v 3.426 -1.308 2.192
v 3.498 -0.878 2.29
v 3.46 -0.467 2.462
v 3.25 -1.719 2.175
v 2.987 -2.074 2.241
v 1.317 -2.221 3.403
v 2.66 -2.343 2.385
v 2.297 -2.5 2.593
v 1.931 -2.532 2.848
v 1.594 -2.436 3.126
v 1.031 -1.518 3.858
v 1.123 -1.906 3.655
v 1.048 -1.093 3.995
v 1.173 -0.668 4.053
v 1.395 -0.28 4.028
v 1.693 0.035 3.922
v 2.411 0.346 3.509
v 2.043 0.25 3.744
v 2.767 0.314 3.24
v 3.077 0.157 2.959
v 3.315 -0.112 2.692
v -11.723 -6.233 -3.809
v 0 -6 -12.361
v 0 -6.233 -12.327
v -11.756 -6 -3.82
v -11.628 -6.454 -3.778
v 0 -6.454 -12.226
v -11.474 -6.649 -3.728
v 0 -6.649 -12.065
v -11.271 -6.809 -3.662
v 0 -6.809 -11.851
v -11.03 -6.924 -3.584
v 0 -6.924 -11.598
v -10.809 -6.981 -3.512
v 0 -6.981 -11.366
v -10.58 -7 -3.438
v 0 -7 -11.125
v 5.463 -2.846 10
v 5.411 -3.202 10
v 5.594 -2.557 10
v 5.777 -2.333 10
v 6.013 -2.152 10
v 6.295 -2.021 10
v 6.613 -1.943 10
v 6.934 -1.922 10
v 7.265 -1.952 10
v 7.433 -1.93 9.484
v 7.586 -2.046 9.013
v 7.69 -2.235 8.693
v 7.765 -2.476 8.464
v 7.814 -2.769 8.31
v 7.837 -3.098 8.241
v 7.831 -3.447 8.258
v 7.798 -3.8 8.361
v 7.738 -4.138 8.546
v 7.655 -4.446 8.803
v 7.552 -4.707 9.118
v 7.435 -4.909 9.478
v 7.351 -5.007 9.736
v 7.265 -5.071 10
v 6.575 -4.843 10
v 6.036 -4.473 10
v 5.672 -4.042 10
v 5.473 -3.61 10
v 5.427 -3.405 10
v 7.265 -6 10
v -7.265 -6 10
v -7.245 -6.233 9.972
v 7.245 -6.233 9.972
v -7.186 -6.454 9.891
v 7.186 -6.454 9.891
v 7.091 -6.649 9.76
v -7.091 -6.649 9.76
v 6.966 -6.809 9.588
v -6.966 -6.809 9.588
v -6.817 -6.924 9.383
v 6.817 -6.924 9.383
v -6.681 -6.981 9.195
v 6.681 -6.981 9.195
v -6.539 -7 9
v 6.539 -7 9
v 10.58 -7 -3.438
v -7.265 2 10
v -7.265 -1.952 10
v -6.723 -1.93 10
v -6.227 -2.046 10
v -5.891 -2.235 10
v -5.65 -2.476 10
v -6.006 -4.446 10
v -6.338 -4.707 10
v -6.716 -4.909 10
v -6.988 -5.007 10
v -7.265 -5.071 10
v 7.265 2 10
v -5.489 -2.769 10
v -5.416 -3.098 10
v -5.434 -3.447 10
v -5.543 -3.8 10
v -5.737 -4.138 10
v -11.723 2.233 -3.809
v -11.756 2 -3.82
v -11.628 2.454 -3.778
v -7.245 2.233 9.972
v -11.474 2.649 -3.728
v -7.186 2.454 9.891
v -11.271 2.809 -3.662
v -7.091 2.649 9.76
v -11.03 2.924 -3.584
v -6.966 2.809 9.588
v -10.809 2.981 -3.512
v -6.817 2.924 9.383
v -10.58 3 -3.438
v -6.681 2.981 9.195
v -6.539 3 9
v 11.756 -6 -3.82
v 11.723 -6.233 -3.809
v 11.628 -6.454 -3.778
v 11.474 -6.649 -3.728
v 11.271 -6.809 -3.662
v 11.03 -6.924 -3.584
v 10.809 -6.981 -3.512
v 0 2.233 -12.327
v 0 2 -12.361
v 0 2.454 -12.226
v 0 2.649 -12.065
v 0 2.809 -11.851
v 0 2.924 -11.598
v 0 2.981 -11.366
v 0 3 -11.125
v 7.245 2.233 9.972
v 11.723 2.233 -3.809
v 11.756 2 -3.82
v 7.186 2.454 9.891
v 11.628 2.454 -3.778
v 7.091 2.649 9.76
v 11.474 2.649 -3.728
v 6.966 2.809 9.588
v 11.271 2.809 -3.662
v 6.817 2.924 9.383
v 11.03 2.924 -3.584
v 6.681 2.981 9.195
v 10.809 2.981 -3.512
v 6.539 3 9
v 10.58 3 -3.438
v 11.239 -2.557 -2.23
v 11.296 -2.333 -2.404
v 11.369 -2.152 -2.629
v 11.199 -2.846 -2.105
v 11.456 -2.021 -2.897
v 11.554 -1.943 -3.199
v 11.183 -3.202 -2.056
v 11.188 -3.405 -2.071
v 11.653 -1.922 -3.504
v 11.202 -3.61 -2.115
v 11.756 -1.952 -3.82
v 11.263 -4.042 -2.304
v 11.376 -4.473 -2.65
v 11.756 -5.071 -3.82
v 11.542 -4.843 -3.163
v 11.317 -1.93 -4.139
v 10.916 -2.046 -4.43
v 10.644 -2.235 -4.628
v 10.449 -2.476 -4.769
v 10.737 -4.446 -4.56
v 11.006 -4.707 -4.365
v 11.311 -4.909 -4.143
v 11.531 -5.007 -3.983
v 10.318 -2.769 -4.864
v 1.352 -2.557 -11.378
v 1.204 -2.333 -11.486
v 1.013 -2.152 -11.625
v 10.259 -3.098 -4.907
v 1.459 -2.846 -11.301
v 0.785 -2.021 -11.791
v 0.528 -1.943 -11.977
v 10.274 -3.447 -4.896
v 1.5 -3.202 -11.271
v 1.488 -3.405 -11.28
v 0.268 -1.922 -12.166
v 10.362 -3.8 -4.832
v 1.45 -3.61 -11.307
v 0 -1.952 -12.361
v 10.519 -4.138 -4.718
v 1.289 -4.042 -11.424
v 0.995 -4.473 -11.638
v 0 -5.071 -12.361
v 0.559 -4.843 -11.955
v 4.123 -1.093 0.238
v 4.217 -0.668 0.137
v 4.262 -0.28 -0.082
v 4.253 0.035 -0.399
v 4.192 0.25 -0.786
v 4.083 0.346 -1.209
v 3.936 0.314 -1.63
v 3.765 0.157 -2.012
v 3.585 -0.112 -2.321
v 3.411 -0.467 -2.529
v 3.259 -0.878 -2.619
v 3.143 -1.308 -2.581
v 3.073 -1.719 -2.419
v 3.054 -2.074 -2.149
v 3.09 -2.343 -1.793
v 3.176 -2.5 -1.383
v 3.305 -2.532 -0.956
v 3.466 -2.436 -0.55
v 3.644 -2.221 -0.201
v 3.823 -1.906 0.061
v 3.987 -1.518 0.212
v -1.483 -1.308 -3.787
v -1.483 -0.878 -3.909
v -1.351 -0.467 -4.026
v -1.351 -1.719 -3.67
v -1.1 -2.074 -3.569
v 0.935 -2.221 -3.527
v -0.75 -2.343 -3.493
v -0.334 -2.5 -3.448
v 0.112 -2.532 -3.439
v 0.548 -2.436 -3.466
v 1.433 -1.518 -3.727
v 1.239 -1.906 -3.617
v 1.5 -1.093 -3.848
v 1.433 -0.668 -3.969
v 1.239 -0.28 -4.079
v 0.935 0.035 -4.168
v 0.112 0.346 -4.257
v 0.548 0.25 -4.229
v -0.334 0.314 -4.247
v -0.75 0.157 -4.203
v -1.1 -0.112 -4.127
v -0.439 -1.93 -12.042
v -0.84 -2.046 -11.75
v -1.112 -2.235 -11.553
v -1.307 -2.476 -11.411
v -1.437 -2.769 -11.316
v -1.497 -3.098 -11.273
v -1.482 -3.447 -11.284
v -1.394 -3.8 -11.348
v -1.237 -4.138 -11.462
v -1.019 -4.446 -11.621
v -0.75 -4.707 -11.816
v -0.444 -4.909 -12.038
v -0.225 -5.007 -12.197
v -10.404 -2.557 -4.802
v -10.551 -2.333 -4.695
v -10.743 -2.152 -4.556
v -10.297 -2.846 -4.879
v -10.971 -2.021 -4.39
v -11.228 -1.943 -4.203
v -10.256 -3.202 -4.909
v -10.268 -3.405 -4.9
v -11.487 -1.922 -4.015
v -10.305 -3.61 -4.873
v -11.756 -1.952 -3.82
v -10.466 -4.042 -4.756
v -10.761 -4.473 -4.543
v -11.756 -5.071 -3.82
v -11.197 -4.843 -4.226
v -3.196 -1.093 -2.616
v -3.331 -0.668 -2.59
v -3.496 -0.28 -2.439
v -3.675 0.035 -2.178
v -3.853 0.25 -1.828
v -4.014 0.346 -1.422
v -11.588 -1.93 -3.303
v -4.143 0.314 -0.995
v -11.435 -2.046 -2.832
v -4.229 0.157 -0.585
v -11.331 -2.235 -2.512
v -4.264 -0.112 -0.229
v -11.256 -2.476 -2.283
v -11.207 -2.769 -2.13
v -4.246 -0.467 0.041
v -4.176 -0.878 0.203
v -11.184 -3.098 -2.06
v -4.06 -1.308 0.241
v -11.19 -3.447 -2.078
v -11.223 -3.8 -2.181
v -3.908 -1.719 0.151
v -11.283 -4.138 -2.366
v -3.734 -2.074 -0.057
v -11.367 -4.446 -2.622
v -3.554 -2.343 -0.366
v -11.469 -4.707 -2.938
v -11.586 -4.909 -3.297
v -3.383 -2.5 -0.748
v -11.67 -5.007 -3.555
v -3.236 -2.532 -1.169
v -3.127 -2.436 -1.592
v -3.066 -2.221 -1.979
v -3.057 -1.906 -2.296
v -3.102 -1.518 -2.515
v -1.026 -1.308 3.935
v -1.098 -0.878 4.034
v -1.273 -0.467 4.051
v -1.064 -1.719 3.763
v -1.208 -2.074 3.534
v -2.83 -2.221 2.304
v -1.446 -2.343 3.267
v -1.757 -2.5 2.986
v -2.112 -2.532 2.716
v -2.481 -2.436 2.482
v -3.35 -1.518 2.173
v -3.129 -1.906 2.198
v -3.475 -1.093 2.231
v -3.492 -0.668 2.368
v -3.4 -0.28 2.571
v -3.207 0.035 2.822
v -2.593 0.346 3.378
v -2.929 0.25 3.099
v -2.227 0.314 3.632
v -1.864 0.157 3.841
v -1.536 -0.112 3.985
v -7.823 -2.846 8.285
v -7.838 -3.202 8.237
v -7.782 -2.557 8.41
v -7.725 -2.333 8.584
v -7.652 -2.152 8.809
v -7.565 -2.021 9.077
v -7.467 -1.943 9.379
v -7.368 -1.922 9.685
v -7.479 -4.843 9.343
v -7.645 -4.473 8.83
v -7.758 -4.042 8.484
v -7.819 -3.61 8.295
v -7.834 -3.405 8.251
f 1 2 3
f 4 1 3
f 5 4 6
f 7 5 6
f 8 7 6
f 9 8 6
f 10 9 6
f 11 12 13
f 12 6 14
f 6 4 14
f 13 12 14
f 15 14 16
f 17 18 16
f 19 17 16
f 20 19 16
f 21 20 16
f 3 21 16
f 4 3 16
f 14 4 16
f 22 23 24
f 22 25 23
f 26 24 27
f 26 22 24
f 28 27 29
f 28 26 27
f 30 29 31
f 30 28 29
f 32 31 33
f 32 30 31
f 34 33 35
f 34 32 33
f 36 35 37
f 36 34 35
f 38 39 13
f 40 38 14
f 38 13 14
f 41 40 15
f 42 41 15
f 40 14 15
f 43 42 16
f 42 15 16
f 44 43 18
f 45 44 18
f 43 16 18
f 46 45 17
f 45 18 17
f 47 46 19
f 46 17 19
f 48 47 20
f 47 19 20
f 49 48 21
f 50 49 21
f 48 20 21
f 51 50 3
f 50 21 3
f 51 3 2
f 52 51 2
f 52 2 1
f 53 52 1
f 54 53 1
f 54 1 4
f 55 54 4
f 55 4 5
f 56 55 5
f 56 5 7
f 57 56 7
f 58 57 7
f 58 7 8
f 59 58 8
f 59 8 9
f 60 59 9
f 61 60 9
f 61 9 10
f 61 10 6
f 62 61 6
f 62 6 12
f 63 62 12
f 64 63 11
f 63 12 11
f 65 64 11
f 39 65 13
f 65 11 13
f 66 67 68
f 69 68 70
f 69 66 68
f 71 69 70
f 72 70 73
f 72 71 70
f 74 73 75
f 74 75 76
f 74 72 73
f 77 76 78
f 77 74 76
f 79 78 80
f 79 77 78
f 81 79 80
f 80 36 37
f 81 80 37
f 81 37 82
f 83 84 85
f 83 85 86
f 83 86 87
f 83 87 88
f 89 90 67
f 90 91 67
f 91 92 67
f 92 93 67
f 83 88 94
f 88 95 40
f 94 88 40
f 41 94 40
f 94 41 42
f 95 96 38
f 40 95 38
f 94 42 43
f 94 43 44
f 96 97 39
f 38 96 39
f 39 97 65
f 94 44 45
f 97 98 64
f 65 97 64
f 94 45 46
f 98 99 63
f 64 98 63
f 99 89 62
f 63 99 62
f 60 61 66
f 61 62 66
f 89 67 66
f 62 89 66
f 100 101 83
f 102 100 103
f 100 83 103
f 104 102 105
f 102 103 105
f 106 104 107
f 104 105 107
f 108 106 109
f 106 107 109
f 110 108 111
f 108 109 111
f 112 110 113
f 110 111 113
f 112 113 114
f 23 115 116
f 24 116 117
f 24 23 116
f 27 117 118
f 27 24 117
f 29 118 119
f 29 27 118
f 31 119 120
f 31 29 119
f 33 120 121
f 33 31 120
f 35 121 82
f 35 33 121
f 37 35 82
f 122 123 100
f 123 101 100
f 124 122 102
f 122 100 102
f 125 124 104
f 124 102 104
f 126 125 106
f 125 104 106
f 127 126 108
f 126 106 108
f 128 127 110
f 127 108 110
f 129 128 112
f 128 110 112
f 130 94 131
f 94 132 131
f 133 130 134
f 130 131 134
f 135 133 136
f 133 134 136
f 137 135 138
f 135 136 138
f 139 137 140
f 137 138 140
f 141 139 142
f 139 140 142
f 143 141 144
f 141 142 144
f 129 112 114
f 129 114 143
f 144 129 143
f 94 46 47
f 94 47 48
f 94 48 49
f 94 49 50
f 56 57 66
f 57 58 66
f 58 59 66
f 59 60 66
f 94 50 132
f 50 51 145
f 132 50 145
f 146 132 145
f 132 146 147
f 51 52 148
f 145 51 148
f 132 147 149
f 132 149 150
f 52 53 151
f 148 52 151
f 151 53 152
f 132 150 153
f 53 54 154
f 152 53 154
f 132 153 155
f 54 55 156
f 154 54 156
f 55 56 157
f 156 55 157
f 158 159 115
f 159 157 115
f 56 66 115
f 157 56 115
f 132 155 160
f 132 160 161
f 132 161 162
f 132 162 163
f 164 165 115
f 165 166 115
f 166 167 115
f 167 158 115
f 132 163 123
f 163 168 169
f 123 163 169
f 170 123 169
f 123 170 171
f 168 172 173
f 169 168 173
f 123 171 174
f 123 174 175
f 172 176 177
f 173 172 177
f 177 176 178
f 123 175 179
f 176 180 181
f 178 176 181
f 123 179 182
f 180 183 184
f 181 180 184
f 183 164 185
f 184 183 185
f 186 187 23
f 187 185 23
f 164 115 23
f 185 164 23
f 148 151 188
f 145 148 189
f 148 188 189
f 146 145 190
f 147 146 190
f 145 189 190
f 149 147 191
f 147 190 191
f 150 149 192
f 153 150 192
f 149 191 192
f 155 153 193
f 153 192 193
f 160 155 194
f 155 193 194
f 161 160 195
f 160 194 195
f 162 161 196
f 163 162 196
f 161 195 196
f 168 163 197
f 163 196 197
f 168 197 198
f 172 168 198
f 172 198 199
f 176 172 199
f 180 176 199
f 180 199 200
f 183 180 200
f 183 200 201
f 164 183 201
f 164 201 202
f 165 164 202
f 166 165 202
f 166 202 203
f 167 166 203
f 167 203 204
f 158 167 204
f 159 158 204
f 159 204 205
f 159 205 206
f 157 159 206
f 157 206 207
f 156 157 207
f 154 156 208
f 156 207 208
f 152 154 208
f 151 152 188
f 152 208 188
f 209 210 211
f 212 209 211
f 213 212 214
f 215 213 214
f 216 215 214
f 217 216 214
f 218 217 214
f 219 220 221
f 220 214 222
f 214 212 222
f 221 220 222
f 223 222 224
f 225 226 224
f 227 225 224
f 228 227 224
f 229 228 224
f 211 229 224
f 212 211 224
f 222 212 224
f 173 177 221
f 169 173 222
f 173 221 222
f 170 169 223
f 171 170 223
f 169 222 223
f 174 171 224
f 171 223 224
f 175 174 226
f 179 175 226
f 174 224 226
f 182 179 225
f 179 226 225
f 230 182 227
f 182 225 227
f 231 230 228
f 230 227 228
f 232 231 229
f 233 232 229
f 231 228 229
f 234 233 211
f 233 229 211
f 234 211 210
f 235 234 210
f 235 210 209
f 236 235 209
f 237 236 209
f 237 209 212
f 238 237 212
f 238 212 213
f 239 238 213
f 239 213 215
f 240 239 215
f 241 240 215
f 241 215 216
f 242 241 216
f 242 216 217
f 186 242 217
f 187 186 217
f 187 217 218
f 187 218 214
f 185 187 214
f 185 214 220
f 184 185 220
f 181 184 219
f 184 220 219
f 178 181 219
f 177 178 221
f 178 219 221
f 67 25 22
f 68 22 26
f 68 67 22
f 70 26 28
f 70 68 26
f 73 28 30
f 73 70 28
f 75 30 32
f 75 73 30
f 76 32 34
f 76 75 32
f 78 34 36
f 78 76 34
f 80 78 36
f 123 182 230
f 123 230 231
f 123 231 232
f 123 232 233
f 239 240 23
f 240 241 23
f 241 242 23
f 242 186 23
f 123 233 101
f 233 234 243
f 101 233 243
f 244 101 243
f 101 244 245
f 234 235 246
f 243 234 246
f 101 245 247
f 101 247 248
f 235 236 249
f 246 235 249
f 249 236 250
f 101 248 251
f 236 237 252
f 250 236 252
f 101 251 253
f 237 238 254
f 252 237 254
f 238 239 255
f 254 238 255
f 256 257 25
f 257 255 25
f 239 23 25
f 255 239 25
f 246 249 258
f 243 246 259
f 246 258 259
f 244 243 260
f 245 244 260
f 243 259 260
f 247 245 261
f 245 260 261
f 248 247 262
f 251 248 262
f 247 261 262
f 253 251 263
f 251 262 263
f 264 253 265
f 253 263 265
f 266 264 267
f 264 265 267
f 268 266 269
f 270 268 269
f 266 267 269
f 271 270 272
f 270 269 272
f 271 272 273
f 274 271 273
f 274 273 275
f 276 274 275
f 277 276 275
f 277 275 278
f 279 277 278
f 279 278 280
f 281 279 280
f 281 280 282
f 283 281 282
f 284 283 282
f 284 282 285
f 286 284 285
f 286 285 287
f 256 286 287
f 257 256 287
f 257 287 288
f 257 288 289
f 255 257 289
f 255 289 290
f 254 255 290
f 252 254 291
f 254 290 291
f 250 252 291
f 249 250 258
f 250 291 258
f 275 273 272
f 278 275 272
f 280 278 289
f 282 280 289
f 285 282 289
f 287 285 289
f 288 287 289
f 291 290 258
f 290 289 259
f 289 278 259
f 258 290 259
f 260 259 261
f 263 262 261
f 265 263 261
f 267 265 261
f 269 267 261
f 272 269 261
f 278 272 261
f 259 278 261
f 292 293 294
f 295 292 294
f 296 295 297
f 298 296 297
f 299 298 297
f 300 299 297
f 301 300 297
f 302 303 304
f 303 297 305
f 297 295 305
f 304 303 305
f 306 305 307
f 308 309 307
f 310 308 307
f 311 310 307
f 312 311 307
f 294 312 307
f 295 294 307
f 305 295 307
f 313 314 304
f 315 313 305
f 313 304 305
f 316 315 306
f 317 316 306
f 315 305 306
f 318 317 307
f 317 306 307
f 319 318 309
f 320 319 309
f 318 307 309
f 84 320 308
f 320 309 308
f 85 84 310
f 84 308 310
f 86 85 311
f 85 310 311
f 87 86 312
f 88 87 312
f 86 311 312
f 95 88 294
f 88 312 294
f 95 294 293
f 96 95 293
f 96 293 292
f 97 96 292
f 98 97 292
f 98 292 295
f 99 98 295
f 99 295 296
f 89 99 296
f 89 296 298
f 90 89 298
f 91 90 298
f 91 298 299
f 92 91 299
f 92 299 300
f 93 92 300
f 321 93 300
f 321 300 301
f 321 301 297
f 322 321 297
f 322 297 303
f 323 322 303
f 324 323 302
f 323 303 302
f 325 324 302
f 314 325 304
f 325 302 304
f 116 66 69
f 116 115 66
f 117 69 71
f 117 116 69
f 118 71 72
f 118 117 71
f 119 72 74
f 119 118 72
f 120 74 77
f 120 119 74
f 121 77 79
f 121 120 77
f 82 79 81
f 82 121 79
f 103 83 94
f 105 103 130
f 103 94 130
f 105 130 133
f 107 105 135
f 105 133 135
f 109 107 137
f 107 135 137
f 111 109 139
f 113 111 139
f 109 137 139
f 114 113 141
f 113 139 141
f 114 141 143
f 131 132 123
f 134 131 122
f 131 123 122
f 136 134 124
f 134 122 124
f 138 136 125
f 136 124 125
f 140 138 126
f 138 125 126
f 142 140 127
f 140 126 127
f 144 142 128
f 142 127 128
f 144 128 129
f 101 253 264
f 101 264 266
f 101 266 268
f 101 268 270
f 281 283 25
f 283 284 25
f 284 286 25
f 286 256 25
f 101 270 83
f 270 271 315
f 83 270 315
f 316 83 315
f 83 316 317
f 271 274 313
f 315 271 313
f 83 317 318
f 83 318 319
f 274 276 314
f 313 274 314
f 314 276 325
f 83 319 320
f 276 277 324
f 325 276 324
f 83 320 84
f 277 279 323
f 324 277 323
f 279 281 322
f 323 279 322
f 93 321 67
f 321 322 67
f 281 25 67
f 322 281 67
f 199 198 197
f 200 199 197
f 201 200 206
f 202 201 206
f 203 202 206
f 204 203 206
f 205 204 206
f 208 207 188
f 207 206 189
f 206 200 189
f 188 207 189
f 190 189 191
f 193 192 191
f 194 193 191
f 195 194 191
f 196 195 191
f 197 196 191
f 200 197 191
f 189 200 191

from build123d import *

# Parameters (mm, degrees)
BOSS_EXTRUDE1_DEPTH      = 3
BOSS_EXTRUDE1_DEPTH_BACK = 7
FILLET1_R                = 1
SKETCH2_R                = 1.5
CUT_EXTRUDE1_DEPTH       = 22.698151839
CIRPATTERN1_COUNT        = 5


with BuildPart() as part:
    # Sketch1 → Boss-Extrude1 (new, two sides: drawn at the far end of the back side and taken through both)
    with BuildSketch(Plane(origin=(0, 0, 0), x_dir=(1, 0, 0), z_dir=(0, 1, 0)).offset(-BOSS_EXTRUDE1_DEPTH_BACK)):
        Polygon((-7.26542528, -10), (7.26542528, -10), (11.755705046, 3.819660113), (0, 12.360679775), (-11.755705046, 3.819660113), align=None)
    extrude(amount=BOSS_EXTRUDE1_DEPTH + BOSS_EXTRUDE1_DEPTH_BACK)

    # Fillet1
    fillet1_edges = [part.edges().sort_by_distance(p)[0] for p in [
        (0, -7, 10),
        (9.510565163, -7, 3.090169944),
        (5.877852523, -7, -8.090169944),
        (-5.877852523, -7, -8.090169944),
        (-9.510565163, -7, 3.090169944),
        (-5.877852523, 3, -8.090169944),
        (5.877852523, 3, -8.090169944),
        (9.510565163, 3, 3.090169944),
        (0, 3, 10),
        (-9.510565163, 3, 3.090169944),
    ]]
    fillet(fillet1_edges, radius=FILLET1_R)

    # Sketch2 → Cut-Extrude1 (cut, through all)
    with BuildSketch(Plane(origin=(-2.261652721, -1.093066116, 3.112897916), x_dir=(-0.824807817325119, 0.18732666439624865, -0.533479882737436), z_dir=(0.56541318031982, 0.2732665289126595, -0.7782244789883274))):
        Circle(SKETCH2_R)
    cut_extrude1 = extrude(amount=-CUT_EXTRUDE1_DEPTH, mode=Mode.SUBTRACT)

    # CirPattern1: Cut-Extrude1 ×5 about axis
    cirpattern1_axis = Axis((0, 5.5, 0), (0, -1, 0))
    for i in range(1, CIRPATTERN1_COUNT):
        add(cut_extrude1.rotate(cirpattern1_axis, i * 360 / CIRPATTERN1_COUNT), mode=Mode.SUBTRACT)


solid = part.part
